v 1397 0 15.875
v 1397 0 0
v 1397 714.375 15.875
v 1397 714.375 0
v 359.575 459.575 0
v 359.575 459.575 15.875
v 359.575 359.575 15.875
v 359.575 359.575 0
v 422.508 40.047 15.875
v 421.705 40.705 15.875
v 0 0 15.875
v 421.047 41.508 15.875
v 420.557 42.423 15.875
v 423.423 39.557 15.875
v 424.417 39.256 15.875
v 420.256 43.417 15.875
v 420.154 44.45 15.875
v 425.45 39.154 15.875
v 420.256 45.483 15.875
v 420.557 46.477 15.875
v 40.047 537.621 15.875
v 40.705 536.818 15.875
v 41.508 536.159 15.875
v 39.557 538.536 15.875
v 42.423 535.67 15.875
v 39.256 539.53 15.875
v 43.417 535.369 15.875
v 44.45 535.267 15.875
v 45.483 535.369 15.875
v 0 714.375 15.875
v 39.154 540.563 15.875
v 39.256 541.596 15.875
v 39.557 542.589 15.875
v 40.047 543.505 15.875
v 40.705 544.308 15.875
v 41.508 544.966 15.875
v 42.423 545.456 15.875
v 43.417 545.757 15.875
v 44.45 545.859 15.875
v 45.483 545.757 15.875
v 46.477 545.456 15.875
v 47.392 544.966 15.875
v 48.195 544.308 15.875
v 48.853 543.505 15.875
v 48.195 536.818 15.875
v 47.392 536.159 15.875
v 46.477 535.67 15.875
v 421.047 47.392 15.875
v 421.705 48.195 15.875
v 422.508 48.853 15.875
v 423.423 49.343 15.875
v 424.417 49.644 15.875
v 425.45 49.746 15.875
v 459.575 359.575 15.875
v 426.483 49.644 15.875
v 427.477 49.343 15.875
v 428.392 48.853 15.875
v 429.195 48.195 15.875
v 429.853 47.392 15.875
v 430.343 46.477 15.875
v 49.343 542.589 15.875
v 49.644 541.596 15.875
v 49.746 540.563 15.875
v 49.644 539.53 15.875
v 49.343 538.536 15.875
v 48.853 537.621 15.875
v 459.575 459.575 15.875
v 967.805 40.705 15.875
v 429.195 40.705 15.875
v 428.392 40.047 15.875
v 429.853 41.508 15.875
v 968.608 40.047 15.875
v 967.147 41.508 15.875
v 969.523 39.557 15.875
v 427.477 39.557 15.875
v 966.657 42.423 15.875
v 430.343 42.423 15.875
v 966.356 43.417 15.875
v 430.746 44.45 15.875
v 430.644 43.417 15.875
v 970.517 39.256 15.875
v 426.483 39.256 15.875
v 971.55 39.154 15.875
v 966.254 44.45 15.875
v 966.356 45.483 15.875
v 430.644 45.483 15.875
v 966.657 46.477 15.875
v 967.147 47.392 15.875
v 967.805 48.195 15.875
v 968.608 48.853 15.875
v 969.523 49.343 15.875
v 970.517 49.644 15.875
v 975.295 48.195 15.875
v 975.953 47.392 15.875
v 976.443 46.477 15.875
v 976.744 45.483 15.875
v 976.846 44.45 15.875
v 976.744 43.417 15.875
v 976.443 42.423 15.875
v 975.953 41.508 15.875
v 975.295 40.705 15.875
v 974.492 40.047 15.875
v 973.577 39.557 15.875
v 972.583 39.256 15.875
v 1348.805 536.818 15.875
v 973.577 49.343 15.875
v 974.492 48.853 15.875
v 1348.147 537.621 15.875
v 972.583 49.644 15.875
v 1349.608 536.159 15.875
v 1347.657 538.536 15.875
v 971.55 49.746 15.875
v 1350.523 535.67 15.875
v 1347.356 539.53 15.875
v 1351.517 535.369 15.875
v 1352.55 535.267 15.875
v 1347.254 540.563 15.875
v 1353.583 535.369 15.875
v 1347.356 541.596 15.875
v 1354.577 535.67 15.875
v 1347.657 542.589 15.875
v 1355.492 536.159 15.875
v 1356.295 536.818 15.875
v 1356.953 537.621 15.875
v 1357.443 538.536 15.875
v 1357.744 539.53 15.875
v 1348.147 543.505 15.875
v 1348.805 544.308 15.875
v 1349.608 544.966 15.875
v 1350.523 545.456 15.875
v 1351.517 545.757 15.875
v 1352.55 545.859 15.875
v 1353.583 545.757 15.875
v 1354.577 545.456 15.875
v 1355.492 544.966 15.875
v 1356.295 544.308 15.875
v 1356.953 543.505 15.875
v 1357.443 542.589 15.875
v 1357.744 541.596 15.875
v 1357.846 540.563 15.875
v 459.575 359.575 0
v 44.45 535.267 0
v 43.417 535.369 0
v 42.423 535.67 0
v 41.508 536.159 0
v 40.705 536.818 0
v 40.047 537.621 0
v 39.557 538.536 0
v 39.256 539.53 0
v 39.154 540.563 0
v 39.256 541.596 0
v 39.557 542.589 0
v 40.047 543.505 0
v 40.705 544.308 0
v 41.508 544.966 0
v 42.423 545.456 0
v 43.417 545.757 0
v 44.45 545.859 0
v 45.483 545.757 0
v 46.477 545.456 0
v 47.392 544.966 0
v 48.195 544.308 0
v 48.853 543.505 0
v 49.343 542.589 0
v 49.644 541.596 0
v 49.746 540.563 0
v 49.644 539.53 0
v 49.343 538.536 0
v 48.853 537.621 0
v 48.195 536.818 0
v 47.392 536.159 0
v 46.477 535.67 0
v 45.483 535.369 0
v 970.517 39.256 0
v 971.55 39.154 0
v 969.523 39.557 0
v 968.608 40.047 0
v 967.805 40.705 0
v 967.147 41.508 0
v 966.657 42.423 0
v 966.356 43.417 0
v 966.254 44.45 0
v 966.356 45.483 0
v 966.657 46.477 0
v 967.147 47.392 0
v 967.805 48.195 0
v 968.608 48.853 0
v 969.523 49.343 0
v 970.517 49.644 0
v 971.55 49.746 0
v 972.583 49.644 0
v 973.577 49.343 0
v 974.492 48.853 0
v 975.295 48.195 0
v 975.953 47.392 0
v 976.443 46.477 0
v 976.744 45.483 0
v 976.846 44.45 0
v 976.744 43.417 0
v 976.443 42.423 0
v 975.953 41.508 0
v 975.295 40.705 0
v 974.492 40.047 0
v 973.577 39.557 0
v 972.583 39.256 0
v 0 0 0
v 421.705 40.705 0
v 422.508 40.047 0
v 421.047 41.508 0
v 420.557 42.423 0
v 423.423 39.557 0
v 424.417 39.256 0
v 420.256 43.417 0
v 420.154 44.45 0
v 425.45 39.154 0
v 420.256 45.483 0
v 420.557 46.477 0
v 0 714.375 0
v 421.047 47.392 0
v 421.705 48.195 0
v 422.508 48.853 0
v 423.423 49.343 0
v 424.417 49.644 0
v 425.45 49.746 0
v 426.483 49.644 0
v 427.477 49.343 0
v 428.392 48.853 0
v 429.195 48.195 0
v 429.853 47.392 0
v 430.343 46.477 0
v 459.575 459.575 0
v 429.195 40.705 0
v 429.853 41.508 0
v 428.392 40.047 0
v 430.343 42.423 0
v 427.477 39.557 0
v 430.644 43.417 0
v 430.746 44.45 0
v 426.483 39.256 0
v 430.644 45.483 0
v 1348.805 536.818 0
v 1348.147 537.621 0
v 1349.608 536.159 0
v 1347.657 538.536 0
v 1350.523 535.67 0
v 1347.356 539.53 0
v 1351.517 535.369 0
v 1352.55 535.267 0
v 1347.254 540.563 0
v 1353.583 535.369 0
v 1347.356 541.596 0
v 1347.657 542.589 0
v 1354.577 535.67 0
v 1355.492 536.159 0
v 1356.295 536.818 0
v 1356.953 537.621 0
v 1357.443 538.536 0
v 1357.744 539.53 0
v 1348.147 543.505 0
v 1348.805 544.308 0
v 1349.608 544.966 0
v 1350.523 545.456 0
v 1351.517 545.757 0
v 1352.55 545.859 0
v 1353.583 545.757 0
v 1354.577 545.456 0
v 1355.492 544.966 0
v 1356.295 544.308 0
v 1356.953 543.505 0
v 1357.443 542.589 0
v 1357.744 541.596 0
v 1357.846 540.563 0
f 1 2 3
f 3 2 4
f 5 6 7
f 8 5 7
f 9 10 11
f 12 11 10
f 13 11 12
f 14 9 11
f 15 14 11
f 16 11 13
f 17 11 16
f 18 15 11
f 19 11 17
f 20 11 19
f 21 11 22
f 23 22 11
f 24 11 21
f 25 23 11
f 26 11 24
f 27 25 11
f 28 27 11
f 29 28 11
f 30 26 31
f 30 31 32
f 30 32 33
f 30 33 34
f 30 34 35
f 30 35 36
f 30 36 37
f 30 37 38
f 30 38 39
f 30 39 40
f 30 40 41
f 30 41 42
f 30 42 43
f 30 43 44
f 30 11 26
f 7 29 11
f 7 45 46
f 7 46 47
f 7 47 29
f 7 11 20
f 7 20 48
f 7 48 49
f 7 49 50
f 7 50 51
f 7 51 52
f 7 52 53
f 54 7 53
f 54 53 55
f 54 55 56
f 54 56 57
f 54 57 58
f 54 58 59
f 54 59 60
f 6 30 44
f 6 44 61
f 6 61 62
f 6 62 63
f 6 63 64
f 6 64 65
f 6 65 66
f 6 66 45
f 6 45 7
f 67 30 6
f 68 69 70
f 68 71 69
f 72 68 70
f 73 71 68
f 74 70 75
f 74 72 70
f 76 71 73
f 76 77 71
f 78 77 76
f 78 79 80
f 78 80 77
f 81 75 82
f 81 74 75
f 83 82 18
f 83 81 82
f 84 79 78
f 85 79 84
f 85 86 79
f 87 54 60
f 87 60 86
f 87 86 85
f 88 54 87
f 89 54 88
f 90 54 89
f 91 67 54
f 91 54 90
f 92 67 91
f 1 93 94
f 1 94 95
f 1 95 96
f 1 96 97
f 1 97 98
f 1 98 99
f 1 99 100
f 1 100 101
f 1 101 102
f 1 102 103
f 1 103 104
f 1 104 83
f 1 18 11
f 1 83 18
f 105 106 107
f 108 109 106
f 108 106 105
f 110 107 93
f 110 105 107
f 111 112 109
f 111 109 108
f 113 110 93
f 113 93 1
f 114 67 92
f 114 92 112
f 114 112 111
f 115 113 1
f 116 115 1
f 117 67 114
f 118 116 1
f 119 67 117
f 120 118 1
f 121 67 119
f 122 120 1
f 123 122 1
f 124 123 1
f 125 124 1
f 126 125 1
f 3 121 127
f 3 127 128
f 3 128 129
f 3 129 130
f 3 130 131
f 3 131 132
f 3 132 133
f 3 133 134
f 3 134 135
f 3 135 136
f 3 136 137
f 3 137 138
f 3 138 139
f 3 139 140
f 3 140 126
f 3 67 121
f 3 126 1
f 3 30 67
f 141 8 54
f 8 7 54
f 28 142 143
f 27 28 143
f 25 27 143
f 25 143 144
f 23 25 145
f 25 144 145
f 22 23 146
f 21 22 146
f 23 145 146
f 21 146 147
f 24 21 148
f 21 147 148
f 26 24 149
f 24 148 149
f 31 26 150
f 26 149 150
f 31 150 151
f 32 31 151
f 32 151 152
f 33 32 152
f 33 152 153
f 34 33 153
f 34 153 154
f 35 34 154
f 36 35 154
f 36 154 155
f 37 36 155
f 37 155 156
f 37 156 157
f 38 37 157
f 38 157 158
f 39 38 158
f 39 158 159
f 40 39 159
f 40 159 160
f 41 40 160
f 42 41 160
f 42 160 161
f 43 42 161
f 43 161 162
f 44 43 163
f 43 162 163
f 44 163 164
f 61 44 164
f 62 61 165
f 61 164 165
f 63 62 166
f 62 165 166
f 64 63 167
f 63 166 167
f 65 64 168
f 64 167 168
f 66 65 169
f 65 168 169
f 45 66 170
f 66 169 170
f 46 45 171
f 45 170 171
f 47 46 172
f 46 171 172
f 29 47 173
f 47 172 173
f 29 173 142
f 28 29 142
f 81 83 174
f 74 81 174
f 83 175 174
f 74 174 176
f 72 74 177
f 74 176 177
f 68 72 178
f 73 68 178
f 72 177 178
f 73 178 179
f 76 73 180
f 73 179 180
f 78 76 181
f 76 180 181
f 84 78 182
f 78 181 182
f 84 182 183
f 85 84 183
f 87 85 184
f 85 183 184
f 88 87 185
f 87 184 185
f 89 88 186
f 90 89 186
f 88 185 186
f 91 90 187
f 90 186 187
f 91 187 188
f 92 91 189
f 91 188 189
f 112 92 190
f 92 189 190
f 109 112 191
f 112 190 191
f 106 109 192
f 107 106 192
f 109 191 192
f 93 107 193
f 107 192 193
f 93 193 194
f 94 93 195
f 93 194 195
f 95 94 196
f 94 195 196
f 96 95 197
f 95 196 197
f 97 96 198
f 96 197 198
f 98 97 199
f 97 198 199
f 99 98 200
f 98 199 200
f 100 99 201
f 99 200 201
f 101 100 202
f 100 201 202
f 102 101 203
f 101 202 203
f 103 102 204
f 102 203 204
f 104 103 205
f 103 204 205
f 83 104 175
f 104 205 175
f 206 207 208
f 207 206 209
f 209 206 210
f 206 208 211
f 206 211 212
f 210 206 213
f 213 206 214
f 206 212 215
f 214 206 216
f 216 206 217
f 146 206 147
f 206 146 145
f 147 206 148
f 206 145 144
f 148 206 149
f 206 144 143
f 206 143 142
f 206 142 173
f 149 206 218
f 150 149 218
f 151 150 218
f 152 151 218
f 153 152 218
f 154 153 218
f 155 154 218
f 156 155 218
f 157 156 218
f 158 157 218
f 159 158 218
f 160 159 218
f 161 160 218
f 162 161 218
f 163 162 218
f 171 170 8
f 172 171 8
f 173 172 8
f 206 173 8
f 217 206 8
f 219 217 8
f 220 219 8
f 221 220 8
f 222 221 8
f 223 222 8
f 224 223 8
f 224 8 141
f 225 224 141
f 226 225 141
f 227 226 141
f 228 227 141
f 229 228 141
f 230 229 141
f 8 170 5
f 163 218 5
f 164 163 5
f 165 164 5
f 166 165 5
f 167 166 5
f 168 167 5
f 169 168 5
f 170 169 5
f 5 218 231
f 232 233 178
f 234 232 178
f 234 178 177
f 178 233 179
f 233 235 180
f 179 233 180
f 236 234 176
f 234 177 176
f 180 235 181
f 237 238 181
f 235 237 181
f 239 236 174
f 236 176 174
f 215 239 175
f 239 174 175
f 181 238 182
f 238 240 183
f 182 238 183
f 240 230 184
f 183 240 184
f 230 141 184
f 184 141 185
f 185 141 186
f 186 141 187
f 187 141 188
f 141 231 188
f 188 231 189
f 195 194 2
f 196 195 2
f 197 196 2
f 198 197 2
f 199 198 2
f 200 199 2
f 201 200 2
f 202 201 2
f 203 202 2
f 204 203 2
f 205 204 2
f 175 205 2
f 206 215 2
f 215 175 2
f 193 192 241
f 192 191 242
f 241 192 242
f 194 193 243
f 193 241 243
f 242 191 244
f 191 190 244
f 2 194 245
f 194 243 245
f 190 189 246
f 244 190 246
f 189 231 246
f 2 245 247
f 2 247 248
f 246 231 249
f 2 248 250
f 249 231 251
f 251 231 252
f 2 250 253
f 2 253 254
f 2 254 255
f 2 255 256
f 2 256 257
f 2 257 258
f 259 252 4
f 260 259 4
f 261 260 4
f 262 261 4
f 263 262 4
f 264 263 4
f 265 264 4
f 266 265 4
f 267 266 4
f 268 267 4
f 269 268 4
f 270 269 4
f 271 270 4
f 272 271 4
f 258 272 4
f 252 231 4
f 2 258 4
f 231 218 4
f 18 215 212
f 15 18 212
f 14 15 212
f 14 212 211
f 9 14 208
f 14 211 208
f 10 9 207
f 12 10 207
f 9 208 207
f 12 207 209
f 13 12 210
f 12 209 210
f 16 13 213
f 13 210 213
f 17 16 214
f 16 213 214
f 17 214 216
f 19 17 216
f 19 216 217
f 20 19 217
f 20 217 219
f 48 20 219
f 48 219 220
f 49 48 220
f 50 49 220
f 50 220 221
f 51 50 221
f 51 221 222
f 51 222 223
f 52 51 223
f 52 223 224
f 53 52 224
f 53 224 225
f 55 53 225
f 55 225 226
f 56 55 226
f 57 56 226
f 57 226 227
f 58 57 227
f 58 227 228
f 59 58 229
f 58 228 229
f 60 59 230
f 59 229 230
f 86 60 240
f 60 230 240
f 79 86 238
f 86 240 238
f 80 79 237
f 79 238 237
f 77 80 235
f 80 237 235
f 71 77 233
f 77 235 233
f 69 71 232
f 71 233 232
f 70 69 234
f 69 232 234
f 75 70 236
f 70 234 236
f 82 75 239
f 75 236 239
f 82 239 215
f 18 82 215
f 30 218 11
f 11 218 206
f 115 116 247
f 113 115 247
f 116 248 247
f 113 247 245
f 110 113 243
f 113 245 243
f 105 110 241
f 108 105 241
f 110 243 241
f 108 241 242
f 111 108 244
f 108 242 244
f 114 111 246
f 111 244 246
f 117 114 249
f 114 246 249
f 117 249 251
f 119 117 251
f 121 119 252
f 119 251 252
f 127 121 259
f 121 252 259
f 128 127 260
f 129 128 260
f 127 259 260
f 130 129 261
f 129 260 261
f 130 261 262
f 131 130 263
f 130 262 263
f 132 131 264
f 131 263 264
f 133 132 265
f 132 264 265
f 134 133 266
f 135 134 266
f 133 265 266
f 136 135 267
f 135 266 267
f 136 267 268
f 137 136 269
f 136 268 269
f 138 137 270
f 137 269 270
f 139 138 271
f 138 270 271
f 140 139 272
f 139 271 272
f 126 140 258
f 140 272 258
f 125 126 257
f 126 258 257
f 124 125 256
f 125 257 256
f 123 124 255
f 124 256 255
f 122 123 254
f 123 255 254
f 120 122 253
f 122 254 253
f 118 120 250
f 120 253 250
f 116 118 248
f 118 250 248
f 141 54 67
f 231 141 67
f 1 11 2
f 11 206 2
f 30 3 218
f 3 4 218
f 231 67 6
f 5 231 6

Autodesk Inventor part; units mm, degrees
ref_plane "YZ Plane" through (0, 0, 0) normal (1, 0, 0) x (0, 1, 0)
ref_plane "XZ Plane" through (0, 0, 0) normal (0, 1, 0) x (-1, 0, 0)
ref_plane "XY Plane" through (0, 0, 0) normal (0, 0, 1) x (1, 0, 0)
sketch "Sketch1" plane through (0, 0, 0) normal (0, 0, 1) x (1, 0, 0)
  line L0 (0, 0) -> (1397, 0)
  line L1 (1397, 0) -> (1397, 714.375)
  line L2 (1397, 714.375) -> (0, 714.375)
  line L3 (0, 714.375) -> (0, 0)
  dimension "d0" = 1397
  dimension "d1" = 714.375
extrude "Extrusion1" add sketch "Sketch1" along normal blind 15.875
sketch "Sketch10" plane through (0, 0, 15.875) normal (0, 0, 1) x (1, 0, 0)
  line L0 (0, 0) -> (1397, 0) projected
  line L1 (1397, 0) -> (1397, 714.375) projected
  line L2 (0, 714.375) -> (0, 0) projected
  line L3 (0, 540.5628) -> (44.45, 540.5628)
  line L4 (425.45, 0) -> (425.45, 44.45)
  line L5 (971.55, 0) -> (971.55, 44.45)
  line L6 (1397, 540.5628) -> (1352.55, 540.5628)
  dimension "d68" = 44.45
  dimension "d69" = 44.45
  dimension "d70" = 44.45
  dimension "d71" = 44.45
hole "Hole4" at (44.45, 540.5628, 15.875) at (425.45, 44.45, 15.875) at (971.55, 44.45, 15.875) at (1352.55, 540.5628, 15.875) direction (0, 0, -1) diameter 10.5918 depth 35.179 tip angle 118 thread size "1/2-13 UNC" class "2B" standard "ANSI Unified Screw Threads"
sketch "Sketch15" plane through (0, 0, 15.875) normal (0, 0, 1) x (1, 0, 0)
  line L0 (0, 714.375) -> (0, 0) projected
  line L1 (0, 0) -> (88.9, 0)
  line L2 (0, 0) -> (1397, 0) projected
  line L3 (88.9, 0) -> (104.775, 0)
  line L4 (104.775, 0) -> (409.575, 0)
  line L5 (409.575, 0) -> (409.575, 409.575)
  line L6 (359.575, 359.575) -> (459.575, 359.575)
  line L7 (459.575, 359.575) -> (459.575, 459.575)
  line L8 (459.575, 459.575) -> (359.575, 459.575)
  line L9 (359.575, 459.575) -> (359.575, 359.575)
  line L10 (359.575, 359.575) -> (459.575, 459.575) construction
  line L11 (459.575, 359.575) -> (359.575, 459.575) construction
  dimension "d107" = 88.9
  dimension "d108" = 15.875
  dimension "d109" = 304.8
  dimension "d110" = 409.575
  dimension "d111" = 100
  dimension "d112" = 100
extrude "Extrusion6" cut sketch "Sketch15" against normal blind 15.875
properties part number "Half Ceiling Model 2"
